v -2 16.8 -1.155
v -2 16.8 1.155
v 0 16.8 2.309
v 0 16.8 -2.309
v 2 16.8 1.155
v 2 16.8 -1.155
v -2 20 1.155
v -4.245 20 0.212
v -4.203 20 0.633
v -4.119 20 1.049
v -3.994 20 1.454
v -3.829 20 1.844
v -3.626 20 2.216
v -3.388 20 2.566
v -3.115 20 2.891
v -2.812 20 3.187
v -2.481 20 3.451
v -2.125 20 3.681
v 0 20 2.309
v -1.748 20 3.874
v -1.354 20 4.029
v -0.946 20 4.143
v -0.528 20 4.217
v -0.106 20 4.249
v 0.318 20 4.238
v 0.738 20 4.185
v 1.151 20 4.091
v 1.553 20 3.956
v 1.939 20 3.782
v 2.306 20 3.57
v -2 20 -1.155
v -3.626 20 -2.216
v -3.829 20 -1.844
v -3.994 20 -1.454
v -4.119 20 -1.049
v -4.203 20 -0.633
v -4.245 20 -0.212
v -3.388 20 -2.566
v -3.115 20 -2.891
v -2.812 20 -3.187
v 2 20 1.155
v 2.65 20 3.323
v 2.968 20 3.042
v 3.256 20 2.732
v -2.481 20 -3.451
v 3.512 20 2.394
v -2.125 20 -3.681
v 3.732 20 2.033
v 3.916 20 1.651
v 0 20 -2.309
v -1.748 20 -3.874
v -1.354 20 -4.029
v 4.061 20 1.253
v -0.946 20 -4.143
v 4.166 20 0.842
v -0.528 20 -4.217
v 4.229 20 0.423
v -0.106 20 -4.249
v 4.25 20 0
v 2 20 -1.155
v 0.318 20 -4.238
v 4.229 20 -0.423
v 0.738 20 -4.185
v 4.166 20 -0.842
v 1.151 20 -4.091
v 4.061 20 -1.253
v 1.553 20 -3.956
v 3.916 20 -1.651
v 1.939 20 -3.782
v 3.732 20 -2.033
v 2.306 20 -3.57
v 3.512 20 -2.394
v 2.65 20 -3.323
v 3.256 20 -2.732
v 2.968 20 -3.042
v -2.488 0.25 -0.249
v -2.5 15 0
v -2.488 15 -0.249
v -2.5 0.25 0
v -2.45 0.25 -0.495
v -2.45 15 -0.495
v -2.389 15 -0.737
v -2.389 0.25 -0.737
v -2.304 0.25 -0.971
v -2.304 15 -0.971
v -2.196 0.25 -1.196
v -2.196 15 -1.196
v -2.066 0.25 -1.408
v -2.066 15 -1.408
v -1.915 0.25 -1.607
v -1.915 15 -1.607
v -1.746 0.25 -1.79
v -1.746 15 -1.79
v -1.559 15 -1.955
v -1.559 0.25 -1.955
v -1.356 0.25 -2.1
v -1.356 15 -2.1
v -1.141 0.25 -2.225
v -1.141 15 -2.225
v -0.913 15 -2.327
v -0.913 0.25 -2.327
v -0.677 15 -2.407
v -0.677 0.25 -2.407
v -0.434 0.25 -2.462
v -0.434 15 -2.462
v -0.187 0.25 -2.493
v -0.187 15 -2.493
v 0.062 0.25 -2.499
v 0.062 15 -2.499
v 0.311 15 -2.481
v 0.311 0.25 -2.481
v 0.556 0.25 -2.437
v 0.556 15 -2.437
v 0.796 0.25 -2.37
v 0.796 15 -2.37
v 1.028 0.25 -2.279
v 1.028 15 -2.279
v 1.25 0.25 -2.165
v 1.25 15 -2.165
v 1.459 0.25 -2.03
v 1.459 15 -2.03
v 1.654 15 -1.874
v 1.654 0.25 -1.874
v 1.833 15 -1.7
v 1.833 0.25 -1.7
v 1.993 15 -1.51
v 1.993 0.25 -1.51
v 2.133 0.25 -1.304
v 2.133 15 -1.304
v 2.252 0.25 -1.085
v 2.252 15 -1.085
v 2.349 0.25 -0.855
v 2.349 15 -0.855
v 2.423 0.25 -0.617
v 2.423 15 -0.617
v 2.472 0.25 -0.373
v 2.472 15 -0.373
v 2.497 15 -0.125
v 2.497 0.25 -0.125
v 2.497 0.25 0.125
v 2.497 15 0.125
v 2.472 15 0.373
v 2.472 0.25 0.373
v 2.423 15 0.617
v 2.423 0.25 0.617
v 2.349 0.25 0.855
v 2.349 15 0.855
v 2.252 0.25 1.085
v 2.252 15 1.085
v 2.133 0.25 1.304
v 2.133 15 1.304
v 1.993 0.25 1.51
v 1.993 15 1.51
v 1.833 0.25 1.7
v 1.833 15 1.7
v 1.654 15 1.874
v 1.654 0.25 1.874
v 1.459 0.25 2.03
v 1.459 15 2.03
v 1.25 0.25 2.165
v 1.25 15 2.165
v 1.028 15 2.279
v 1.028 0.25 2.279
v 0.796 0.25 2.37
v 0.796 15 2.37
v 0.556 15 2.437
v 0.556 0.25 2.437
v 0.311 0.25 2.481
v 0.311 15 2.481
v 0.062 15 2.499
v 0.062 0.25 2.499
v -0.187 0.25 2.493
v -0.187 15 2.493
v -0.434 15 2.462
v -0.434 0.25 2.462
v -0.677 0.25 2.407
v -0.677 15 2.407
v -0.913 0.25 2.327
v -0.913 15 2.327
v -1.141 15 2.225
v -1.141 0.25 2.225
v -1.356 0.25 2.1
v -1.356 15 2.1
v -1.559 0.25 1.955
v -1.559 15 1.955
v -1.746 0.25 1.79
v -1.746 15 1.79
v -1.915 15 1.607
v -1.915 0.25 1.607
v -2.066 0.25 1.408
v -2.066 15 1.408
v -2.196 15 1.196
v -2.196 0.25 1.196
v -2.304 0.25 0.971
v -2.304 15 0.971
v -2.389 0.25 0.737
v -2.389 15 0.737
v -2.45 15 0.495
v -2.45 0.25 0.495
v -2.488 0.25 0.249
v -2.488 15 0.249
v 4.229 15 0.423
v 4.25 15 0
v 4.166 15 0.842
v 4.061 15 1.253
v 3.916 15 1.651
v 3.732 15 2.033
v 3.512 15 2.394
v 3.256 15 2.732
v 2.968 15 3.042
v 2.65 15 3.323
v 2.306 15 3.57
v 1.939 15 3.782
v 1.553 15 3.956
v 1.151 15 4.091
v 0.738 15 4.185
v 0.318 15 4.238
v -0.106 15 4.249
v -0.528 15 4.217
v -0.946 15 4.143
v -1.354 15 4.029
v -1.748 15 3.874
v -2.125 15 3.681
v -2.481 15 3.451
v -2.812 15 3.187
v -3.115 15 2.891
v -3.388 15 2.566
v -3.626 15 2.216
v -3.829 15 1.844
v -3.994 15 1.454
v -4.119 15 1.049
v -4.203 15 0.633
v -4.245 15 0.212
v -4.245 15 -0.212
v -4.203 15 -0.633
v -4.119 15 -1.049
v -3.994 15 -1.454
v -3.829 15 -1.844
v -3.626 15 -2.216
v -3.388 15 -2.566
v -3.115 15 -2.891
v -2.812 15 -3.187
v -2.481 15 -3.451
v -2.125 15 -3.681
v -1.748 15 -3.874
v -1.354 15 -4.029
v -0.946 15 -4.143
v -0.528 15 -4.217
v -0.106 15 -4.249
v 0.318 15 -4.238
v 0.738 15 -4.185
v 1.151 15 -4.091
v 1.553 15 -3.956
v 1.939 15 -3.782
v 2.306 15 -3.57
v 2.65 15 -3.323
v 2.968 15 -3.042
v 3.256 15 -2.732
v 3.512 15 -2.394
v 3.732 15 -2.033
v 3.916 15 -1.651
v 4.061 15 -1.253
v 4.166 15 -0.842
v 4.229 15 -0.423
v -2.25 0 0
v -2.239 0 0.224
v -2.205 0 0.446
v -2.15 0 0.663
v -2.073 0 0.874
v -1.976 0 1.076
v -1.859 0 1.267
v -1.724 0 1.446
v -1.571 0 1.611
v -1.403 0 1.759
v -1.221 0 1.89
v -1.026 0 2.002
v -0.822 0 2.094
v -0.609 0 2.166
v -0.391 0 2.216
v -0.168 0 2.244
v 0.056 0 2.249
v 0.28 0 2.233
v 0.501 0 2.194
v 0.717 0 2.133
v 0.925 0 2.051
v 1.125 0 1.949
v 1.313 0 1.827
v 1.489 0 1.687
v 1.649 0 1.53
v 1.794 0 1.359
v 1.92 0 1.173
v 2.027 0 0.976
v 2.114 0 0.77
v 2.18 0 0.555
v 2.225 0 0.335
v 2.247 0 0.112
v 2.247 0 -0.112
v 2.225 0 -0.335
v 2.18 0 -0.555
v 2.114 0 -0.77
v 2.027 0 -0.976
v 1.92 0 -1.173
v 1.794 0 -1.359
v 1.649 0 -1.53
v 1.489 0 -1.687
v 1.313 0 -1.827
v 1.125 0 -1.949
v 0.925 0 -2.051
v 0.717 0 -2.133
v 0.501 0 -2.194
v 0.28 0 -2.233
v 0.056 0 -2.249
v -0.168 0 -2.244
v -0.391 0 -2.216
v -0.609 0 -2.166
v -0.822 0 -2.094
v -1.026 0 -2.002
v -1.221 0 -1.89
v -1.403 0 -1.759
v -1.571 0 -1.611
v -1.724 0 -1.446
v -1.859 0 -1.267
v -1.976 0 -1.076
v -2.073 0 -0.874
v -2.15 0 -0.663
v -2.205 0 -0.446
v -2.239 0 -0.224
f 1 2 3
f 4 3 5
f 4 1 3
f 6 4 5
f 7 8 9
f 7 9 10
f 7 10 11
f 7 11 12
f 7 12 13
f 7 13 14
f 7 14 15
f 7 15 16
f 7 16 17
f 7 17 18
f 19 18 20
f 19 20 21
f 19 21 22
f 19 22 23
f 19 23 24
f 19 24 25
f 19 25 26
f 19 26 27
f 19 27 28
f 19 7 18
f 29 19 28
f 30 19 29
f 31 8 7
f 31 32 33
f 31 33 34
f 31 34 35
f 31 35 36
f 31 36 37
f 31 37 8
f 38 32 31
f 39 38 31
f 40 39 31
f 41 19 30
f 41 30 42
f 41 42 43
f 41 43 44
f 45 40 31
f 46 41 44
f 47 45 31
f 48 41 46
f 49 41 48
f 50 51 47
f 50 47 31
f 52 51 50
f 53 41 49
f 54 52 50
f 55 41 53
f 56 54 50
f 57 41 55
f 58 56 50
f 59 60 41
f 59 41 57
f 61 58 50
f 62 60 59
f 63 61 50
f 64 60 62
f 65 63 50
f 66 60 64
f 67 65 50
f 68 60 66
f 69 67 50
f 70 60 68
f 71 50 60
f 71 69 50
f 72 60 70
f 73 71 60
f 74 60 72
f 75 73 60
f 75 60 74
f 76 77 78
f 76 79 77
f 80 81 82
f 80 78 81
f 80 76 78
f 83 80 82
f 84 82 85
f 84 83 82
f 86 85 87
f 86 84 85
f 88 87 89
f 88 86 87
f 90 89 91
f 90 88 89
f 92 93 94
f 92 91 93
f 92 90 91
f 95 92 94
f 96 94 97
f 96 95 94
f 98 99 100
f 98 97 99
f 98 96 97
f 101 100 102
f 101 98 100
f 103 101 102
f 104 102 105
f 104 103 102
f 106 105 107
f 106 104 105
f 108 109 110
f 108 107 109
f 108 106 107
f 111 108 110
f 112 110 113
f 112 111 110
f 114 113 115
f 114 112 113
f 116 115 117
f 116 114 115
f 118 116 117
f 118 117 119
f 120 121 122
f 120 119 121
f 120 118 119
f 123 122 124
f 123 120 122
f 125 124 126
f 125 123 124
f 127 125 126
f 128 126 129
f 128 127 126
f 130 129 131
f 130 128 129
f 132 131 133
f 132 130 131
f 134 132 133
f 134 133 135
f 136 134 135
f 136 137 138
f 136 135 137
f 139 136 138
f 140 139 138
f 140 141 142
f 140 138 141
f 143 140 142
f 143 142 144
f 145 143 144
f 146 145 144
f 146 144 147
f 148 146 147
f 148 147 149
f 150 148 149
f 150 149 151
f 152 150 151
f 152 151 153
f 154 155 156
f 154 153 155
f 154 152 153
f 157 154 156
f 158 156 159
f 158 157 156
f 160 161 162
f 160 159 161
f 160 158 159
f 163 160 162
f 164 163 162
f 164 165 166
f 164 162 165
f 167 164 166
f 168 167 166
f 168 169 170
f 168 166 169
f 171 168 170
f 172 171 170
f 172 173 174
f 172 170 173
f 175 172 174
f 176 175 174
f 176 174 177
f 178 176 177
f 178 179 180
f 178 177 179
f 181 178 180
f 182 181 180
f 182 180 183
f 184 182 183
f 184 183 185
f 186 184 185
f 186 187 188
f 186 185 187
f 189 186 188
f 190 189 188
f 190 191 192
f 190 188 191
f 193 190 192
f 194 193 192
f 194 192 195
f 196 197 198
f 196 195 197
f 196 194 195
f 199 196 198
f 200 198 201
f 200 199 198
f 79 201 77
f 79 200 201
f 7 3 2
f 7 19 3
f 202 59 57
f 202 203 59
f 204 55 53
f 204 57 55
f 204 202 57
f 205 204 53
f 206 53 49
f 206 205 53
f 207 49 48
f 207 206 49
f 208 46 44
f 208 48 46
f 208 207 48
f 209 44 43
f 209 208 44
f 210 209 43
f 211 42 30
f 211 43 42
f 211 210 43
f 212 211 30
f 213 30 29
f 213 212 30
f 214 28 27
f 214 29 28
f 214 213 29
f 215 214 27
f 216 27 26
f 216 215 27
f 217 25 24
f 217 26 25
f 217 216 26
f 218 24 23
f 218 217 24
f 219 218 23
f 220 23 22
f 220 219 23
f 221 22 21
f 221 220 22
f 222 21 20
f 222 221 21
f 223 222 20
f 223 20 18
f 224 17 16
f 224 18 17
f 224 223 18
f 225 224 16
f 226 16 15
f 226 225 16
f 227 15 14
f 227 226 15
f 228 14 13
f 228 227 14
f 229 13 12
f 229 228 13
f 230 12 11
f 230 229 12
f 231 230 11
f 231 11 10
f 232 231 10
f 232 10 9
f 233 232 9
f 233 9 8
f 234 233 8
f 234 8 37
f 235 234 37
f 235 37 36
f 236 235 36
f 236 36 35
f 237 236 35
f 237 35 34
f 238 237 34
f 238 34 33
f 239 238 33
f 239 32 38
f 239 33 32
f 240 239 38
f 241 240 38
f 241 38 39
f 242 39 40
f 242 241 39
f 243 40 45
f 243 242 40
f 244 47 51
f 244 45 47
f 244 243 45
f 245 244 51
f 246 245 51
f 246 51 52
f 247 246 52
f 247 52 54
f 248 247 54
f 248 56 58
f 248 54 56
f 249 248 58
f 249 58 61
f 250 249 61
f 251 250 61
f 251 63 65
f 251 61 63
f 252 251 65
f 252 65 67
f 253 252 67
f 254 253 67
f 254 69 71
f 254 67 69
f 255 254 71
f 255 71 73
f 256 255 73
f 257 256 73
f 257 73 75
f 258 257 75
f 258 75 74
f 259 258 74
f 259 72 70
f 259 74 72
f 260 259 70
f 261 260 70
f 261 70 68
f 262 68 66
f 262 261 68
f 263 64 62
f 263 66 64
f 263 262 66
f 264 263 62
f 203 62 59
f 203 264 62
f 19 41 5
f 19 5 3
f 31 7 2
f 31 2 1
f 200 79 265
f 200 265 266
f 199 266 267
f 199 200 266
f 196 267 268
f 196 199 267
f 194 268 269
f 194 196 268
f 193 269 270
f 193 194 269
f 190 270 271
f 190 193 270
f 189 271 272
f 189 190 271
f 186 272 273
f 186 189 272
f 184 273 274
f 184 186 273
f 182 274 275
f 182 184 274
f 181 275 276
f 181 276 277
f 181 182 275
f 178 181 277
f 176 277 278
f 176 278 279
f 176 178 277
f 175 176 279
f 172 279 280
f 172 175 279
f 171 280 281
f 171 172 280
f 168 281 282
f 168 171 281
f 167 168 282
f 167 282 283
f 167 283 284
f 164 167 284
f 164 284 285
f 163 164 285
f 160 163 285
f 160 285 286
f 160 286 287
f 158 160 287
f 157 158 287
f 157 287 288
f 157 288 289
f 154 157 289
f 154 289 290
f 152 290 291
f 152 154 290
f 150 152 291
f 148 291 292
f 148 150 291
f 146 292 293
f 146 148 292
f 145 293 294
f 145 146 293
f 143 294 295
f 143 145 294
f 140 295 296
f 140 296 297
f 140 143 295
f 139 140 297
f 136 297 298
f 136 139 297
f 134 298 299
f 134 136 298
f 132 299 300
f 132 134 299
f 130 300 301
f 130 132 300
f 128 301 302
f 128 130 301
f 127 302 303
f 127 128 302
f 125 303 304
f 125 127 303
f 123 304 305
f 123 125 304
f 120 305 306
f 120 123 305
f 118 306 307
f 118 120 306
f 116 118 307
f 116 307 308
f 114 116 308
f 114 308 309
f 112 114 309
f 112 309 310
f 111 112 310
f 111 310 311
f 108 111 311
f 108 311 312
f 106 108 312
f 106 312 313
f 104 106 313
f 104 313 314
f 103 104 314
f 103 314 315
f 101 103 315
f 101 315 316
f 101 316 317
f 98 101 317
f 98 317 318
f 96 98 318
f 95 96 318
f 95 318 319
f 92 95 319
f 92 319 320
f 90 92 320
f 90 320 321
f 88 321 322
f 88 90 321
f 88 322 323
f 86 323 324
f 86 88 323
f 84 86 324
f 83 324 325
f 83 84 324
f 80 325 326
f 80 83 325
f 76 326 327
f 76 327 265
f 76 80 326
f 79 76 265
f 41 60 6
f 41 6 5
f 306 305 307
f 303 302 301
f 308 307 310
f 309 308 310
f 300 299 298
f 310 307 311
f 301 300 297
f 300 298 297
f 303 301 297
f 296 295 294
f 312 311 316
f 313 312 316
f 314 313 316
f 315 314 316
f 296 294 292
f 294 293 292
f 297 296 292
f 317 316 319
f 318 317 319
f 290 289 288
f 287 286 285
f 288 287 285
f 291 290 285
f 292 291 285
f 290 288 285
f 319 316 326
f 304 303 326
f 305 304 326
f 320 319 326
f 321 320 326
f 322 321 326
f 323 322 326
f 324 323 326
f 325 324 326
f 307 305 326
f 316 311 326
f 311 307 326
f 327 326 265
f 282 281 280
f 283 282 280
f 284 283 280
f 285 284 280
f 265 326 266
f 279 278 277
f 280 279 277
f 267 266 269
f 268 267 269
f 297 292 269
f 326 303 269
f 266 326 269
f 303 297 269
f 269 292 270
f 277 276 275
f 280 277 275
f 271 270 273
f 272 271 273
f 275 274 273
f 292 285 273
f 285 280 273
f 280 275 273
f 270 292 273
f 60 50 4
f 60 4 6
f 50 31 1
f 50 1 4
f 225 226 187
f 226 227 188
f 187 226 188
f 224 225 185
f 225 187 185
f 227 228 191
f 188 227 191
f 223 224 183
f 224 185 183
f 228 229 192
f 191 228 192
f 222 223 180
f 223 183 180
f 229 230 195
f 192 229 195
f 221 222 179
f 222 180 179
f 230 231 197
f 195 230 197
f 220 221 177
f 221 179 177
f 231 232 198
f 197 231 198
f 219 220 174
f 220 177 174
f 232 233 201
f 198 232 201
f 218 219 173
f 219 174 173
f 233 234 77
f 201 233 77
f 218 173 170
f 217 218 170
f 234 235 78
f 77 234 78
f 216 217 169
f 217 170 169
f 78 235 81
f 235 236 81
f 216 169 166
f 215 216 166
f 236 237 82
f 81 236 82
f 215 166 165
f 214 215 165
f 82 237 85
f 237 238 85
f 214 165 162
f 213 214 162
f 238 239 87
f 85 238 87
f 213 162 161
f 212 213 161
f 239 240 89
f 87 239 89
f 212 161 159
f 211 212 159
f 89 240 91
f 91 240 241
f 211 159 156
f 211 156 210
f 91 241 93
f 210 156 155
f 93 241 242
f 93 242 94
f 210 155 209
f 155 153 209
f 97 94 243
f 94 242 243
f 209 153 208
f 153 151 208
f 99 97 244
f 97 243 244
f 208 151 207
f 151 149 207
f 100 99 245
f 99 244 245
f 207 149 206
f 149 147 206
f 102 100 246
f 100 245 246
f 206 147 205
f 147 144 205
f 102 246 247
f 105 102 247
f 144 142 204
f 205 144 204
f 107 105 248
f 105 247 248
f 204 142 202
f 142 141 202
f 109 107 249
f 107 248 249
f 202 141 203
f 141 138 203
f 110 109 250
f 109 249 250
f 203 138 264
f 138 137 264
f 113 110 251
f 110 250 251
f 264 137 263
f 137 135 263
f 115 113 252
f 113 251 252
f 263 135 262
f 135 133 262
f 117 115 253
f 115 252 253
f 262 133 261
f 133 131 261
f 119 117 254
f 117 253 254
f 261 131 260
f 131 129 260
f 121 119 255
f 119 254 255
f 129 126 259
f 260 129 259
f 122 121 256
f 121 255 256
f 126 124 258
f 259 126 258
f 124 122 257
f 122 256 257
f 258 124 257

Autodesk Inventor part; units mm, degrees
ref_plane "YZ Plane" through (0, 0, 0) normal (1, 0, 0) x (0, 1, 0)
ref_plane "XZ Plane" through (0, 0, 0) normal (0, 1, 0) x (-1, 0, 0)
ref_plane "XY Plane" through (0, 0, 0) normal (0, 0, 1) x (1, 0, 0)
sketch "Sketch1" plane through (0, 0, 0) normal (0, 1, 0) x (-1, 0, 0)
  circle A0 centre (0, 0) radius 2.5
  dimension "d0" = 5
extrude "Extrusion1" add sketch "Sketch1" along normal blind 15
sketch "Sketch2" plane through (0, 15, 0) normal (0, 1, 0) x (1, 0, 0)
  circle A0 centre (0, 0) radius 2.5 projected
  circle A1 centre (0, 0) radius 4.25
  dimension "d3" = 8.5
extrude "Extrusion2" add sketch "Sketch2" along normal blind 5 contours A0 | A1
sketch "Sketch3" plane through (0, 20, 0) normal (0, 1, 0) x (1, 0, 0)
  circle A0 centre (0, 0) radius 4.25 projected
  line L0 (0, 2.3094) -> (2, 1.1547)
  line L1 (2, 1.1547) -> (2, -1.1547)
  line L2 (2, -1.1547) -> (0, -2.3094)
  line L3 (0, -2.3094) -> (-2, -1.1547)
  line L4 (-2, -1.1547) -> (-2, 1.1547)
  line L5 (-2, 1.1547) -> (0, 2.3094)
  dimension "d6" = 2
extrude "Extrusion3" cut sketch "Sketch3" against normal blind 3.2 contours L0 L1 L2 L3 L4 L5
thread "Thread1" size "M5x0.8" class "6g" standard "ANSI Metric M Profile" full length
chamfer "Chamfer1" distance 0.25 angle 45 1 edges at (2.5, 0, 0)
properties part number "SHCS5x15" material "Stainless Steel"
